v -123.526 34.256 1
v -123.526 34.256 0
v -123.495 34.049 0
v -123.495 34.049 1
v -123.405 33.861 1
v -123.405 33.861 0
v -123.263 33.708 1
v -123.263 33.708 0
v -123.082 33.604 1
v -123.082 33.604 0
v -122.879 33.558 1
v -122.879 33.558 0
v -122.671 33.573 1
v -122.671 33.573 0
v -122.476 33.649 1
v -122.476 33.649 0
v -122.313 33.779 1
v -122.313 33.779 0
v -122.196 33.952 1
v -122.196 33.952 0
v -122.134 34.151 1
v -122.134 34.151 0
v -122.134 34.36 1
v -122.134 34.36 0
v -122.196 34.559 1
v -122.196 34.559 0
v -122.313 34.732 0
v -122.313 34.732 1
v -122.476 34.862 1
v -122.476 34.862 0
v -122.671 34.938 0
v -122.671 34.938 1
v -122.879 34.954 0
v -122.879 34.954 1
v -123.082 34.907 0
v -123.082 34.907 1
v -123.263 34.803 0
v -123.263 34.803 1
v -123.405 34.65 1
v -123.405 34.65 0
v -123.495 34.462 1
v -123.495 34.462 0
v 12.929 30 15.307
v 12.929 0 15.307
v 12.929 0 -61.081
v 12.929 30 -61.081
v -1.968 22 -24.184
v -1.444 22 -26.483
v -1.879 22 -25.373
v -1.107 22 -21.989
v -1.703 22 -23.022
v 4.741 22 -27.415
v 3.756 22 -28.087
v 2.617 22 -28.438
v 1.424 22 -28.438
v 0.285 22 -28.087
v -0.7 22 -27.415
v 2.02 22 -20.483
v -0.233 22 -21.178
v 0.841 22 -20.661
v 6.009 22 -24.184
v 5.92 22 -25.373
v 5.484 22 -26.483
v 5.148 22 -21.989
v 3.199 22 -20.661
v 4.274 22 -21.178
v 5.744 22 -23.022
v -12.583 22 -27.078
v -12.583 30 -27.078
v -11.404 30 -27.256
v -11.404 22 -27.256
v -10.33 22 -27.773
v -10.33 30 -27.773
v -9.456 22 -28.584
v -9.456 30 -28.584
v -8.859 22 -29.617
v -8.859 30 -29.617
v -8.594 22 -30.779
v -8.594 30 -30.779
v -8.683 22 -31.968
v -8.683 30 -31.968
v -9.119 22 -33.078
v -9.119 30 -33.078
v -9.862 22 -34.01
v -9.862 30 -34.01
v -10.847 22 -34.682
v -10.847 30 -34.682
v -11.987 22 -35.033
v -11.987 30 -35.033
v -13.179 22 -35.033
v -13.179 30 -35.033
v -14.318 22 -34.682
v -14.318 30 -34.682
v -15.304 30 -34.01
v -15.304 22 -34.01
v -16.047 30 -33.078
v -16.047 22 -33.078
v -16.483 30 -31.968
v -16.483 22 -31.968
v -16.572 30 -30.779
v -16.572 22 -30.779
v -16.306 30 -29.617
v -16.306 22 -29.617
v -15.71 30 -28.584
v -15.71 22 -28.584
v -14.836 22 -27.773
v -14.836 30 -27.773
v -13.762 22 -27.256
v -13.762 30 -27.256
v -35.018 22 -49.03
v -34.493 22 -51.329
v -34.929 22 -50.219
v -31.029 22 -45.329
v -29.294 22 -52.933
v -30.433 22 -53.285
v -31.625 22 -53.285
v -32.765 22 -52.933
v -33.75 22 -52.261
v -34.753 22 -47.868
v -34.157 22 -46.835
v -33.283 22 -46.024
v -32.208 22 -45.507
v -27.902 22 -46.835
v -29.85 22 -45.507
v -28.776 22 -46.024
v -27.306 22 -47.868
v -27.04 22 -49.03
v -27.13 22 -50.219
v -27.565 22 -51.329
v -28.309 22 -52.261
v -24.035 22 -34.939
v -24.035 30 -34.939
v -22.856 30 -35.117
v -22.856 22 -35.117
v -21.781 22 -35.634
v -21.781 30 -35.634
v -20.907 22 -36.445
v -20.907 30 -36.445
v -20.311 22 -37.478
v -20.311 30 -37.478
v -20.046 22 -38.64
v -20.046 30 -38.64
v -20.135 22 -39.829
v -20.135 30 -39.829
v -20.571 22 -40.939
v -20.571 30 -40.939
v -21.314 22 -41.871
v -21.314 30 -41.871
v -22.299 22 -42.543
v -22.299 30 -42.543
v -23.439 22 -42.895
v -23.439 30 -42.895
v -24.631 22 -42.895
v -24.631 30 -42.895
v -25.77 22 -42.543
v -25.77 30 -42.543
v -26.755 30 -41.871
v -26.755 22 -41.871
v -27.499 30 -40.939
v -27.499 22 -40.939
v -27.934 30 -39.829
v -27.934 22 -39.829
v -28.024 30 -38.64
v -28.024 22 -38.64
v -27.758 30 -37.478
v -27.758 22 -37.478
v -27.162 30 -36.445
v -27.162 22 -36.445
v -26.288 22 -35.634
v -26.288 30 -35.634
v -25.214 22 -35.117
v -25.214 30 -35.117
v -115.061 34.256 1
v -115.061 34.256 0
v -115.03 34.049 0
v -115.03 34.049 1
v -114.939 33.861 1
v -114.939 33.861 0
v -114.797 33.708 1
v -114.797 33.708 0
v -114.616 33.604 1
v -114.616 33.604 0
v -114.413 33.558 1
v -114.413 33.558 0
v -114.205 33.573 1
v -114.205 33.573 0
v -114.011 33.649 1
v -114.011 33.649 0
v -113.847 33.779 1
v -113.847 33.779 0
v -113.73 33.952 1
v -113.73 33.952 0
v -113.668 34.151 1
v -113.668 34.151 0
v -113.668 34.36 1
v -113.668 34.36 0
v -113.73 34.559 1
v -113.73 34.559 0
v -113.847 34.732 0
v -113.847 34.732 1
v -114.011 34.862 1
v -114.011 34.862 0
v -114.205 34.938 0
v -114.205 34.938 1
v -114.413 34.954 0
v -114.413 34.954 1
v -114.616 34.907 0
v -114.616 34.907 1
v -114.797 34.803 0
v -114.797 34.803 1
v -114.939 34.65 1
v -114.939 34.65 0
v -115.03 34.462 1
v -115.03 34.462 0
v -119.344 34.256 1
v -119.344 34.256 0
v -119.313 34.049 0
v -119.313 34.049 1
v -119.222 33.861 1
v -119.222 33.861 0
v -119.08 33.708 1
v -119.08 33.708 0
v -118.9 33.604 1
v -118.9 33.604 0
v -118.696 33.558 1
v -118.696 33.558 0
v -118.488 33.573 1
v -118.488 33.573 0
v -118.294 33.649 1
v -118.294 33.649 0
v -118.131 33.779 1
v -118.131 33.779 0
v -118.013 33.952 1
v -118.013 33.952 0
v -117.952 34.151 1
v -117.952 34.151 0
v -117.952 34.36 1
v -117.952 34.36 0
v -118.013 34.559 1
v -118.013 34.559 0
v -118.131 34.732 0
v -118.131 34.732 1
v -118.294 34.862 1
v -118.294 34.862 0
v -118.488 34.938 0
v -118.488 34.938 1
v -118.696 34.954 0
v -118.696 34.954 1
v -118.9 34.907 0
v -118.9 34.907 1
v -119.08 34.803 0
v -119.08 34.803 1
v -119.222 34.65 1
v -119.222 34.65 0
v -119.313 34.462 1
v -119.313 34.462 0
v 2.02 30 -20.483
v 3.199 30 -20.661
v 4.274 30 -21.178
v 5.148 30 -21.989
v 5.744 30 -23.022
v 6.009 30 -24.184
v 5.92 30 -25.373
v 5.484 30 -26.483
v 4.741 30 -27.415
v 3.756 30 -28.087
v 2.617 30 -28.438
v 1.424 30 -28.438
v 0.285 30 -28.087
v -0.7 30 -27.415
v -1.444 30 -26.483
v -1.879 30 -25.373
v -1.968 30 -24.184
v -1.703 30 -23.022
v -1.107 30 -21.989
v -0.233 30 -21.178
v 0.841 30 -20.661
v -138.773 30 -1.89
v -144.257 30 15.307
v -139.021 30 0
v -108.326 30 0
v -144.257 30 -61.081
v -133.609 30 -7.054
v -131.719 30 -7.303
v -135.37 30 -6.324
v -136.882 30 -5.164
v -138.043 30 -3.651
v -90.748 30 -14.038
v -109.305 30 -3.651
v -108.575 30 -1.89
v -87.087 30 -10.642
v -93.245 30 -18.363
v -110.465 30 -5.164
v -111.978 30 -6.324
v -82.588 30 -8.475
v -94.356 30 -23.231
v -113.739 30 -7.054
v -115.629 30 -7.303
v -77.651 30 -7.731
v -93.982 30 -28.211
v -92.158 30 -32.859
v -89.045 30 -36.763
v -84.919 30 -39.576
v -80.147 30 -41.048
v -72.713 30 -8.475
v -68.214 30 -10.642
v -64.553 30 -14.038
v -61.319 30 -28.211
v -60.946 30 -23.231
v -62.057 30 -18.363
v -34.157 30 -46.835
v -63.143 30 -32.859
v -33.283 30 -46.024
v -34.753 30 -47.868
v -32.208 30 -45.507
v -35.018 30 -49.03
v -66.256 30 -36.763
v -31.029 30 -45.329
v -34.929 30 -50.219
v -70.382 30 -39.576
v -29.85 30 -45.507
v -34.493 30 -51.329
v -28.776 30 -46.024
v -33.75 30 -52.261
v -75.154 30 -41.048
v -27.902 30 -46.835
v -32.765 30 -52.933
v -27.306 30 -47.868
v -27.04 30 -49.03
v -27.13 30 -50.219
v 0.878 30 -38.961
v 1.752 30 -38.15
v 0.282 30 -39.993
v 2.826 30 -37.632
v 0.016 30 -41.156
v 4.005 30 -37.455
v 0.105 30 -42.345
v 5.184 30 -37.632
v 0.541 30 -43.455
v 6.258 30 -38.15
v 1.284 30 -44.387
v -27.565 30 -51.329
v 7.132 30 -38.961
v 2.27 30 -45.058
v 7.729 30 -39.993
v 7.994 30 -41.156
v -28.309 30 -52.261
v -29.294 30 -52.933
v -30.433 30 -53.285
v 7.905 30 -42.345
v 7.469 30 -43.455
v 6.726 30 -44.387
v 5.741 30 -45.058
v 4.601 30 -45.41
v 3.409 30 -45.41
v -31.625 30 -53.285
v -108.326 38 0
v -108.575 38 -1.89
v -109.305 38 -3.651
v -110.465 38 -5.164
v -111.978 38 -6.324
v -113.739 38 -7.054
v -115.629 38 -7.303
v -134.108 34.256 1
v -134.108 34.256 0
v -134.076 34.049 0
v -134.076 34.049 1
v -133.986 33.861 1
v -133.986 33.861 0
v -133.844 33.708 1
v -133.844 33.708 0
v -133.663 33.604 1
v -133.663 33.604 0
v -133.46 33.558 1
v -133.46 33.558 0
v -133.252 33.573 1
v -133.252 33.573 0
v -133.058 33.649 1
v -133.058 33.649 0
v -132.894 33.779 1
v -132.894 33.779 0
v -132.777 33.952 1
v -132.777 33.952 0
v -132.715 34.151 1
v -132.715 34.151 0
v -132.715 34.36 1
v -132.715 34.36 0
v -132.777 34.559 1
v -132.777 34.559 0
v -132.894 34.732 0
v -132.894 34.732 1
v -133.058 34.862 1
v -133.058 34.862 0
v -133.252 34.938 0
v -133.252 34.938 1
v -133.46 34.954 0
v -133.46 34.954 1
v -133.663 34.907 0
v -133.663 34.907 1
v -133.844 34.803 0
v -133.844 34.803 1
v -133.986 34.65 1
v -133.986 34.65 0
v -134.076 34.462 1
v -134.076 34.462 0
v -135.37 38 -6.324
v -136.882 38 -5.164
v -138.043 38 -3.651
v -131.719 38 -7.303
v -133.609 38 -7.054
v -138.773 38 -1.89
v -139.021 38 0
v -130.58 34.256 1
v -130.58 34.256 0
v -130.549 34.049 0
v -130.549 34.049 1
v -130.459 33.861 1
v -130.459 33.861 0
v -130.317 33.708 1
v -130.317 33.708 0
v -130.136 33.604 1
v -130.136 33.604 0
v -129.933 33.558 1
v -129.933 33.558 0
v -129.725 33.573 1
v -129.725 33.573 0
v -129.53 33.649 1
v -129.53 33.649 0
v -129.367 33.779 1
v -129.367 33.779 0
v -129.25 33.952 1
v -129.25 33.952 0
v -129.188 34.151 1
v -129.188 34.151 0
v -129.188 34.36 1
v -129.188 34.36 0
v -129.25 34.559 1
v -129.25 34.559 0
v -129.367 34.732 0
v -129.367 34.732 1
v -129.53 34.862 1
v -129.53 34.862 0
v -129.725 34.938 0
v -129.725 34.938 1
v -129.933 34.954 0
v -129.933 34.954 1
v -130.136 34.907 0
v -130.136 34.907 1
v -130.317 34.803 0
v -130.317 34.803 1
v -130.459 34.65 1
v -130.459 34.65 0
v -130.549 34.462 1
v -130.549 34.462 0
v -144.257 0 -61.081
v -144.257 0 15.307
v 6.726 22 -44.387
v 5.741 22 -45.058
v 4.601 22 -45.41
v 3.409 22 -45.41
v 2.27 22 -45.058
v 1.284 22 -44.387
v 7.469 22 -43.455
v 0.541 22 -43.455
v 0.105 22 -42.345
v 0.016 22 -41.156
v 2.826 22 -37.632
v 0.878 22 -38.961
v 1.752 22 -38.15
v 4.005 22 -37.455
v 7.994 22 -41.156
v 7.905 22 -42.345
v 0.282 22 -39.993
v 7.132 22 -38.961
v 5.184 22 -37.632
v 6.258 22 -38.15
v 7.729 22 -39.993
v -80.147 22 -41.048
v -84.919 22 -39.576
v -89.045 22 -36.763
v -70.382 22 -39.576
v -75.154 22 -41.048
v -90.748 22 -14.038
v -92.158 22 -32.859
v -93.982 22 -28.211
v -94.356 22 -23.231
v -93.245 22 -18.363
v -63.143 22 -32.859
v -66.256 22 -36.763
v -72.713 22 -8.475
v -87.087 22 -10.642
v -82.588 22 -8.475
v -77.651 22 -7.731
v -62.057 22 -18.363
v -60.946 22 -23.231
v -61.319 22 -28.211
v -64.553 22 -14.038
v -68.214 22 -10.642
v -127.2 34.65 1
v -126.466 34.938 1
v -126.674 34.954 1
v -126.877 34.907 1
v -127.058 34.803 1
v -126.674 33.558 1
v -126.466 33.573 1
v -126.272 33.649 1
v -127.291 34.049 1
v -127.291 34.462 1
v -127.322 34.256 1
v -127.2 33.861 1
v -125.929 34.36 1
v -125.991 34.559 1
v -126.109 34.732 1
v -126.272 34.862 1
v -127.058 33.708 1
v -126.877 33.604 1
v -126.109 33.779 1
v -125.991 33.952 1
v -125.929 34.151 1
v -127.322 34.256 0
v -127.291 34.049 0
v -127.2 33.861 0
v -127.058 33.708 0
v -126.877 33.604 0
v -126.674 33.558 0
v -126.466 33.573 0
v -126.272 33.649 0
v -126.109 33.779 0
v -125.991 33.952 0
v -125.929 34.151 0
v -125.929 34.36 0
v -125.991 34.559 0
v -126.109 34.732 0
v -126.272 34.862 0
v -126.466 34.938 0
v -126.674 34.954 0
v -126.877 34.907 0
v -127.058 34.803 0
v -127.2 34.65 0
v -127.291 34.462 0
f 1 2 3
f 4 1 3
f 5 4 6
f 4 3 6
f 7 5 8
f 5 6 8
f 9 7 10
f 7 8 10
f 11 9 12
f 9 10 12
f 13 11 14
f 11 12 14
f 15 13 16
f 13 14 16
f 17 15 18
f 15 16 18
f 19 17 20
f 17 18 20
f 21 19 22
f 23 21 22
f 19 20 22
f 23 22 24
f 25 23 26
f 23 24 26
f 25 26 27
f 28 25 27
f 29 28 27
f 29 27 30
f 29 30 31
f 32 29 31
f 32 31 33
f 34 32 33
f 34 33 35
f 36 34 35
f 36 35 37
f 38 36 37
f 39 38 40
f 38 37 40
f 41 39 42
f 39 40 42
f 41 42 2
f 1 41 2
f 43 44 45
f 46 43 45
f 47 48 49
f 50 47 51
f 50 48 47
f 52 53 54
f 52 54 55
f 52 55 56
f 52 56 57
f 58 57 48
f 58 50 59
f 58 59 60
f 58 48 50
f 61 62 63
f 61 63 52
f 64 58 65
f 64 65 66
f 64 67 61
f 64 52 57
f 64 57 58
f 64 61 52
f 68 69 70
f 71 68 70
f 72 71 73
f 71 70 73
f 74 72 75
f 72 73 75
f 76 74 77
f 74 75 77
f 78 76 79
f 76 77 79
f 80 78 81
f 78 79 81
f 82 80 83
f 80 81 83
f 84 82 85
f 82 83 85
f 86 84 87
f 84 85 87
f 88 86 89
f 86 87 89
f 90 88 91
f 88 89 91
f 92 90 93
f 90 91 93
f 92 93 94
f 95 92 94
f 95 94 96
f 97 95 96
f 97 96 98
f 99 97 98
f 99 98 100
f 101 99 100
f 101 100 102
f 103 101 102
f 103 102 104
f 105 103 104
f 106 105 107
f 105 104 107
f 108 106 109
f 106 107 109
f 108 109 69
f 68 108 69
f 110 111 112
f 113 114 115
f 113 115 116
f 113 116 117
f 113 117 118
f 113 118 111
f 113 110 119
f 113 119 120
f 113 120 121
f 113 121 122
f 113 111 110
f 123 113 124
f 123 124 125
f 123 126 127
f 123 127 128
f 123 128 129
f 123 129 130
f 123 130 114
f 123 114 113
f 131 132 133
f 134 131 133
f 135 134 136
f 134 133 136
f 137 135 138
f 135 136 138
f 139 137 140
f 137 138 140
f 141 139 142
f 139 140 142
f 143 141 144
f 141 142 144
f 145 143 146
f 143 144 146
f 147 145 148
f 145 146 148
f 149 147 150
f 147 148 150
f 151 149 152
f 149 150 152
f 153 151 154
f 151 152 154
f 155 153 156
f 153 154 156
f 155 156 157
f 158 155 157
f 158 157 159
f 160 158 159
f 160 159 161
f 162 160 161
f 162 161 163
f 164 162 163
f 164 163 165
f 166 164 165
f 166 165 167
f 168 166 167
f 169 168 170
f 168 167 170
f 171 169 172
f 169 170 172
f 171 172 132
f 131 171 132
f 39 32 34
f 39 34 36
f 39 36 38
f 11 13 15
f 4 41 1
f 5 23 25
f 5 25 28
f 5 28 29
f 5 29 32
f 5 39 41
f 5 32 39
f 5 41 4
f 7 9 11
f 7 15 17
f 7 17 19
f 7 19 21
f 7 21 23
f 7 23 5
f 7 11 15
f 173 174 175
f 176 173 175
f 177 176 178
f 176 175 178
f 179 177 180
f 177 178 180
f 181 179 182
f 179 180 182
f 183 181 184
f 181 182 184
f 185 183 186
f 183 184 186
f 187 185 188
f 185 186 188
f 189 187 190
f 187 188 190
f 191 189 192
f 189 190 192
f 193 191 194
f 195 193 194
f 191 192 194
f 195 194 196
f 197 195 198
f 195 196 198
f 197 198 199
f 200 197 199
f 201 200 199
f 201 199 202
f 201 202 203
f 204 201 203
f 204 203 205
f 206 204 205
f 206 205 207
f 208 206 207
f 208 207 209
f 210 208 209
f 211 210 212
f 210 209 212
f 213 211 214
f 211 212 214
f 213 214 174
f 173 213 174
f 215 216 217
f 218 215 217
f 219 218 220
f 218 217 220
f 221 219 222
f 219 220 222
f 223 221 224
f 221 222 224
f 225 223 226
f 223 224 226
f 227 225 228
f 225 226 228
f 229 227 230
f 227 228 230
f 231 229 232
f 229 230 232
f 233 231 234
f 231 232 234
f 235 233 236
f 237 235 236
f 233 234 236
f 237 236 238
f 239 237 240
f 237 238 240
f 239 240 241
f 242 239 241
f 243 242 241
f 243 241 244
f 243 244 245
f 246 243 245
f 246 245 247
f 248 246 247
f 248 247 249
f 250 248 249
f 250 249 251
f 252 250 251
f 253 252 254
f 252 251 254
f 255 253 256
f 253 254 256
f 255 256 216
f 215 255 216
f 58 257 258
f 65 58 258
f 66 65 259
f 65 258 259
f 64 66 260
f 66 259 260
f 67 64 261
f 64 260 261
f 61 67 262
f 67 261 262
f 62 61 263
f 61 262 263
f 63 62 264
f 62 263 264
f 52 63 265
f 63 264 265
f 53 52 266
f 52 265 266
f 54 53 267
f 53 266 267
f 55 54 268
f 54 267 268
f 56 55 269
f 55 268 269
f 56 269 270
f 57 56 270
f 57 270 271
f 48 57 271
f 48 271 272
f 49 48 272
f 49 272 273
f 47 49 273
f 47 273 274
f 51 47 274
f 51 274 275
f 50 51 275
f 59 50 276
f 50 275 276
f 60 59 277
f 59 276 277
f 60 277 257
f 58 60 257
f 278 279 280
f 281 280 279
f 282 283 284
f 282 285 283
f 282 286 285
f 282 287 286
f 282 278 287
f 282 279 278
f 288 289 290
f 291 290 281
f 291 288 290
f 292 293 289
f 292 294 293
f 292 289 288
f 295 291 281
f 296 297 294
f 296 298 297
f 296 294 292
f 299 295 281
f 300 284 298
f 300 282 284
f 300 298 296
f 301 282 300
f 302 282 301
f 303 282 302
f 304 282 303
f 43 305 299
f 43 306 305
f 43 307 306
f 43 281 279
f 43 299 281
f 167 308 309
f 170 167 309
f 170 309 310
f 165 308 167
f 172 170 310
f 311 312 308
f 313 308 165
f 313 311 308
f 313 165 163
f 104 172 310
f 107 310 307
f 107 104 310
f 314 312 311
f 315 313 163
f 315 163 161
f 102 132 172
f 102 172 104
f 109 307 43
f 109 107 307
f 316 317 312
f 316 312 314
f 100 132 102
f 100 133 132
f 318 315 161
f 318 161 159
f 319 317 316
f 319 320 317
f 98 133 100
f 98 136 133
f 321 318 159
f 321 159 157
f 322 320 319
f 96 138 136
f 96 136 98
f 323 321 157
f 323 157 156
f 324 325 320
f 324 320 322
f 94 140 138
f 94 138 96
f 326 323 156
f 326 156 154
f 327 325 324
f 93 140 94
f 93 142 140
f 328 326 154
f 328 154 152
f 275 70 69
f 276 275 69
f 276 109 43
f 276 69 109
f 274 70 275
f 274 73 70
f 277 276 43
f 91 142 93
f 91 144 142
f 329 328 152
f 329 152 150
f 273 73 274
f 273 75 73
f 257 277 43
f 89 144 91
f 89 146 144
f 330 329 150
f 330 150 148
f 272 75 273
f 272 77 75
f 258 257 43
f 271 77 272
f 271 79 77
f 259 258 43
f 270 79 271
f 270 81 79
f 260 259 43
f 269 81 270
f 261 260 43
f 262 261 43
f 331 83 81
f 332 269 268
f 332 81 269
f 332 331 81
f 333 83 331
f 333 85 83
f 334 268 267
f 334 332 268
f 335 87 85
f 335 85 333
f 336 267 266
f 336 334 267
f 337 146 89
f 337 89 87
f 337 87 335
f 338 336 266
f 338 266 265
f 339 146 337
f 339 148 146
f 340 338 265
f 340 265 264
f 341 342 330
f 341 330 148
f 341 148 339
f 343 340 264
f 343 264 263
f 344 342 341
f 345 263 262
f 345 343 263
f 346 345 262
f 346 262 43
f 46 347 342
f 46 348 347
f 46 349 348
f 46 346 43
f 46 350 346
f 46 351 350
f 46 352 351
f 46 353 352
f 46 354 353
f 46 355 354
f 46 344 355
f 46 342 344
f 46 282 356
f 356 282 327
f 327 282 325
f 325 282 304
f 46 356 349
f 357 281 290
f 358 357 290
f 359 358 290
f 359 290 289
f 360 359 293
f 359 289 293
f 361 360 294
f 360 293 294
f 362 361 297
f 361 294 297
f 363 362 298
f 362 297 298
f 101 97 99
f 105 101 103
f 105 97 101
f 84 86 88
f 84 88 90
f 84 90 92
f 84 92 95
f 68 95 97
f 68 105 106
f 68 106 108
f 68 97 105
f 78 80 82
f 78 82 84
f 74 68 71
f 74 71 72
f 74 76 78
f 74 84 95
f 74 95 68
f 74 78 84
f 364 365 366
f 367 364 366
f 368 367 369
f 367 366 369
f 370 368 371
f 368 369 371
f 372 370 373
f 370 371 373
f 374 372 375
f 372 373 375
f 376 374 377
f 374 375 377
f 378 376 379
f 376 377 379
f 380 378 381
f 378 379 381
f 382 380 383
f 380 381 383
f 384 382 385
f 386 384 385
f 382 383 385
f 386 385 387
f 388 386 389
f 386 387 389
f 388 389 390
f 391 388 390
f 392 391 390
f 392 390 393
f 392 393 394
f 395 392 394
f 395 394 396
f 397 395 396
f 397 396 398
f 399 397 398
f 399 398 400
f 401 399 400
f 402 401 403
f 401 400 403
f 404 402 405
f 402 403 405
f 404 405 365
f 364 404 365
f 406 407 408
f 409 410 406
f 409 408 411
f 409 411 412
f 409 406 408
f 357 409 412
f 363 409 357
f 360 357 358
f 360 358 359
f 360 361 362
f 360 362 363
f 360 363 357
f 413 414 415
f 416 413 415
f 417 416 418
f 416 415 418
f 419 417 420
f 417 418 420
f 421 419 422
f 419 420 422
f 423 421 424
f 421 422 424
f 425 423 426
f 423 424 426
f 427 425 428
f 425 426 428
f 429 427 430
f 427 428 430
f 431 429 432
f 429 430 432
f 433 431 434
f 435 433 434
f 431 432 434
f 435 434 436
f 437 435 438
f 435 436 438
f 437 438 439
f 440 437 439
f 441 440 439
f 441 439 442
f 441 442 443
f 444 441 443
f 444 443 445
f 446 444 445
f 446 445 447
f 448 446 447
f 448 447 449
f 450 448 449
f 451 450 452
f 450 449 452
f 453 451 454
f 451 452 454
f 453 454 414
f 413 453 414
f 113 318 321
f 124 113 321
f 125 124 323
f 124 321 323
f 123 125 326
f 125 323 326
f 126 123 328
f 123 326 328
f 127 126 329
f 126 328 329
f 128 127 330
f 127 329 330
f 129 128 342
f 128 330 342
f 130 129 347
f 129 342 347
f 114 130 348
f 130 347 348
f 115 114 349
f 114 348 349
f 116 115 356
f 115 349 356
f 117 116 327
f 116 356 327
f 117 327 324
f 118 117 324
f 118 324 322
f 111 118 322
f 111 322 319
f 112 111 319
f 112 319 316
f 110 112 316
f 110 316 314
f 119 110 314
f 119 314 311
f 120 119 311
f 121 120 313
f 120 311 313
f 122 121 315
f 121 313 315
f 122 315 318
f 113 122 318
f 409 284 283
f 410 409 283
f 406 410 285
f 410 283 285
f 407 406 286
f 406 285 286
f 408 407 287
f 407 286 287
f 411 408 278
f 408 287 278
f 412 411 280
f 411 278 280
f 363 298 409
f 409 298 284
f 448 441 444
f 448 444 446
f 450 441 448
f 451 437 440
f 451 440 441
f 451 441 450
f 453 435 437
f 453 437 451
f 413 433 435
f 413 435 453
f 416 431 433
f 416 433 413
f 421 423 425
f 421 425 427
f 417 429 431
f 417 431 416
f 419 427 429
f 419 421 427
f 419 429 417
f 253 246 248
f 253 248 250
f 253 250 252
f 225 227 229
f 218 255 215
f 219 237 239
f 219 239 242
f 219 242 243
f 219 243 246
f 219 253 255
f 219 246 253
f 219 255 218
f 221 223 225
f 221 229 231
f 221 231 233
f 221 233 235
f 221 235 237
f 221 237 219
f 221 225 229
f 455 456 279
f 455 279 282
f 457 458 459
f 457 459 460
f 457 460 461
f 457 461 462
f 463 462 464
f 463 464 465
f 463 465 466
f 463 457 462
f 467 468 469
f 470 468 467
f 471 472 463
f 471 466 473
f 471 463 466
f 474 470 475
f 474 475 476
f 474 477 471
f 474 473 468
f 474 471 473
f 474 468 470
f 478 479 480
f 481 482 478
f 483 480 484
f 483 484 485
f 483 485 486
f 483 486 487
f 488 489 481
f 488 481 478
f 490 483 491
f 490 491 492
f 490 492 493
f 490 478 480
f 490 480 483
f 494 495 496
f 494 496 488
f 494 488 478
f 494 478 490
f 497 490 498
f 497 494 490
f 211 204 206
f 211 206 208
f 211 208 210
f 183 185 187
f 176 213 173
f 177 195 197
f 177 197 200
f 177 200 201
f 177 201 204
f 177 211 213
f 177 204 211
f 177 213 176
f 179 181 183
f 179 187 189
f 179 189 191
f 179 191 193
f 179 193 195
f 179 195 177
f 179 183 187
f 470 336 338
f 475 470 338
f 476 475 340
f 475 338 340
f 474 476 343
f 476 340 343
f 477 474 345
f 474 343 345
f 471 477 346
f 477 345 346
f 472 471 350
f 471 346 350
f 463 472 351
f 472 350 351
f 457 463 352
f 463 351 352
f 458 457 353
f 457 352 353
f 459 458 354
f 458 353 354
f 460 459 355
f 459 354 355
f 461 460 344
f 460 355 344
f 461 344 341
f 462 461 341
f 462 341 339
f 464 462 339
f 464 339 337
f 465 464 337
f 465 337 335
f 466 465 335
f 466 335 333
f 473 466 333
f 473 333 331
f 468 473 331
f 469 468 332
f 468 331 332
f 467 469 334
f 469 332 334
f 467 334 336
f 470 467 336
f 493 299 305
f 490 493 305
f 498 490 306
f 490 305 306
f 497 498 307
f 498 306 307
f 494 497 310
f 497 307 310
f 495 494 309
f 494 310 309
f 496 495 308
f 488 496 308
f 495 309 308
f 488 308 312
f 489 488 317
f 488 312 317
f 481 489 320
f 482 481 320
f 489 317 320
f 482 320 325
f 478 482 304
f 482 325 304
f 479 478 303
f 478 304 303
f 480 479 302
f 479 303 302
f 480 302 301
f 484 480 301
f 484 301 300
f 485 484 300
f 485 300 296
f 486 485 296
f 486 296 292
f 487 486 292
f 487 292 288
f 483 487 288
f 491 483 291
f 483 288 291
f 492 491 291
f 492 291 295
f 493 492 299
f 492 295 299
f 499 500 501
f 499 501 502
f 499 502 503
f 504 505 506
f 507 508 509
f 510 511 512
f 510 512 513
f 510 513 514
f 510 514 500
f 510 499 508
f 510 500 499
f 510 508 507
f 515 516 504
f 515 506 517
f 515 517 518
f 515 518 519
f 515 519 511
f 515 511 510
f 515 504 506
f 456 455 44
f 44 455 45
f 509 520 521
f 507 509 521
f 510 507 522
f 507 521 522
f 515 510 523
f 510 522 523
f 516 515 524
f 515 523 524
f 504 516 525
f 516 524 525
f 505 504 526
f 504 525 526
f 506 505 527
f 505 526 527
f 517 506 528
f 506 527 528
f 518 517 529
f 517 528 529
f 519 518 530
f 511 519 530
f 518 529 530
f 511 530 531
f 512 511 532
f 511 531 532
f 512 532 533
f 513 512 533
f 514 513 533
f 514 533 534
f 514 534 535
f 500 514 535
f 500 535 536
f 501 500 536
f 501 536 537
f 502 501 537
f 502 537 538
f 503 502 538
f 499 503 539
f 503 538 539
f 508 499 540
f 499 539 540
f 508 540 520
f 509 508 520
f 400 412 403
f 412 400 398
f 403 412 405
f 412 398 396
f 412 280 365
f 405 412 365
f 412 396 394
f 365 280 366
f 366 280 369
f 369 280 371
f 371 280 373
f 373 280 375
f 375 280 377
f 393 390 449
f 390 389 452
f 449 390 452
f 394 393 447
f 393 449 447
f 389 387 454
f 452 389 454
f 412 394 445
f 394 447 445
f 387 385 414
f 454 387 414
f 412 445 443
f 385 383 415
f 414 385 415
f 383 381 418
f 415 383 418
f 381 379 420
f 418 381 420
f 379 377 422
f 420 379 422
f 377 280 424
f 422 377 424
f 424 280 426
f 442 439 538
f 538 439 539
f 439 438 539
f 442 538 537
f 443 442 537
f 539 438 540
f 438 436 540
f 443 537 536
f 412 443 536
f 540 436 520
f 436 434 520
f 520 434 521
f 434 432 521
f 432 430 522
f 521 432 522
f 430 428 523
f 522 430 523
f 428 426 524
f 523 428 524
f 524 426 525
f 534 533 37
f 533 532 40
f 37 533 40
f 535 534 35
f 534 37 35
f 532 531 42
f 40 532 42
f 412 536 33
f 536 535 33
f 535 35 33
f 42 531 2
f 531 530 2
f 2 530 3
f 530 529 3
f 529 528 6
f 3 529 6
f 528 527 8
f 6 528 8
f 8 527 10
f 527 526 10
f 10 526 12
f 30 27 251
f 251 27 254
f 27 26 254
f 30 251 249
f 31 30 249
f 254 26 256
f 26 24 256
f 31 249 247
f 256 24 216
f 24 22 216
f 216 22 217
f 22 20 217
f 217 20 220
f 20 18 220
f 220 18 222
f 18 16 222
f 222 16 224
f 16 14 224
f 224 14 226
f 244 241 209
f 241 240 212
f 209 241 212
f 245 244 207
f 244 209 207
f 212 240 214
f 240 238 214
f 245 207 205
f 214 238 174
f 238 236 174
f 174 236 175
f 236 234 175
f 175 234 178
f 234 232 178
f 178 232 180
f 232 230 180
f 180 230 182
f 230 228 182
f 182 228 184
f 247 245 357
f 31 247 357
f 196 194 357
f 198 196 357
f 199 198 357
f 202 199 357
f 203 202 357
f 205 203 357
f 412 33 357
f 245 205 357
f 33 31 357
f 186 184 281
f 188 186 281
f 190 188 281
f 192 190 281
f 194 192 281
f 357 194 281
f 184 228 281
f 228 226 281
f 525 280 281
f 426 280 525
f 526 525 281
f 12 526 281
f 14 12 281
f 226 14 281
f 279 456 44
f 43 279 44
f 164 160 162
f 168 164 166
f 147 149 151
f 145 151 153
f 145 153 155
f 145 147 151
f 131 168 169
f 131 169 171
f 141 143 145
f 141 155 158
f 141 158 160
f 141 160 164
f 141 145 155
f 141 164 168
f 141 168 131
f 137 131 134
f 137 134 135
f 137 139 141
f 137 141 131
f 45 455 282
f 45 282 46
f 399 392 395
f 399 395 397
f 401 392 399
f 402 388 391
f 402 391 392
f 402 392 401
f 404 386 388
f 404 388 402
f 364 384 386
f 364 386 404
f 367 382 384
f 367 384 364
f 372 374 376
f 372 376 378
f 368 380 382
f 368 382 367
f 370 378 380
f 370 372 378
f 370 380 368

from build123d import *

# Parameters (mm, degrees)
SKETCH1_W           = 157.185890266
SKETCH1_H           = 76.388087763
BOSS_EXTRUDE1_DEPTH = 30
SKETCH2_R           = 4
SKETCH2_R_2         = 16.751919573
CUT_EXTRUDE1_DEPTH  = 8
BOSS_EXTRUDE5_DEPTH = 8
SKETCH8_R           = 0.7
BOSS_EXTRUDE6_DEPTH = 1


with BuildPart() as part:
    # Sketch1 → Boss-Extrude1 (new body)
    with BuildSketch(Plane(origin=(0, 0, 0), x_dir=(1, 0, 0), z_dir=(0, 1, 0))):
        with Locations((-65.664274203, 22.88675236)):
            Rectangle(SKETCH1_W, SKETCH1_H)
    extrude(amount=BOSS_EXTRUDE1_DEPTH)

    # Sketch2 → Cut-Extrude1 (cut)
    with BuildSketch(Plane(origin=(0, 30, 0), x_dir=(1, 0, 0), z_dir=(0, 1, 0))):
        with Locations((2.020364903, 24.483023403)):
            Circle(SKETCH2_R)
        with Locations((-12.582950978, 31.07817581)):
            Circle(SKETCH2_R)
        with Locations((-24.034725928, 38.939278582)):
            Circle(SKETCH2_R)
        with Locations((-31.0292801, 49.329254707)):
            Circle(SKETCH2_R)
        with Locations((4.005067314, 41.454528732)):
            Circle(SKETCH2_R)
        with Locations((-77.650582925, 24.483023403)):
            Circle(SKETCH2_R_2)
    extrude(amount=-CUT_EXTRUDE1_DEPTH, mode=Mode.SUBTRACT)

    # Sketch3 → Boss-Extrude5 (add)
    with BuildSketch(Plane(origin=(0, 30, 0), x_dir=(1, 0, 0), z_dir=(0, 1, 0))):
        with BuildLine():
            Line((-115.629013378, 7.30264293), (-131.71869807, 7.30264293))
            ThreePointArc((-131.71869807, 7.30264293), (-136.882446407, 5.163748337), (-139.021341, 0))
            Line((-139.021341, 0), (-108.326370448, 0))
            ThreePointArc((-108.326370448, 0), (-110.465265042, 5.163748337), (-115.629013378, 7.30264293))
        make_face()
    extrude(amount=BOSS_EXTRUDE5_DEPTH)

    # Sketch8 → Boss-Extrude6 (add)
    with BuildSketch(Plane.XY):
        with Locations((-133.40757623, 34.255602161)):
            Circle(SKETCH8_R)
        with Locations((-129.880481724, 34.255602161)):
            Circle(SKETCH8_R)
        with Locations((-126.621646944, 34.255602161)):
            Circle(SKETCH8_R)
        with Locations((-122.826292713, 34.255602161)):
            Circle(SKETCH8_R)
        with Locations((-118.643776602, 34.255602161)):
            Circle(SKETCH8_R)
        with Locations((-114.360631583, 34.255602161)):
            Circle(SKETCH8_R)
    extrude(amount=BOSS_EXTRUDE6_DEPTH)


solid = part.part
